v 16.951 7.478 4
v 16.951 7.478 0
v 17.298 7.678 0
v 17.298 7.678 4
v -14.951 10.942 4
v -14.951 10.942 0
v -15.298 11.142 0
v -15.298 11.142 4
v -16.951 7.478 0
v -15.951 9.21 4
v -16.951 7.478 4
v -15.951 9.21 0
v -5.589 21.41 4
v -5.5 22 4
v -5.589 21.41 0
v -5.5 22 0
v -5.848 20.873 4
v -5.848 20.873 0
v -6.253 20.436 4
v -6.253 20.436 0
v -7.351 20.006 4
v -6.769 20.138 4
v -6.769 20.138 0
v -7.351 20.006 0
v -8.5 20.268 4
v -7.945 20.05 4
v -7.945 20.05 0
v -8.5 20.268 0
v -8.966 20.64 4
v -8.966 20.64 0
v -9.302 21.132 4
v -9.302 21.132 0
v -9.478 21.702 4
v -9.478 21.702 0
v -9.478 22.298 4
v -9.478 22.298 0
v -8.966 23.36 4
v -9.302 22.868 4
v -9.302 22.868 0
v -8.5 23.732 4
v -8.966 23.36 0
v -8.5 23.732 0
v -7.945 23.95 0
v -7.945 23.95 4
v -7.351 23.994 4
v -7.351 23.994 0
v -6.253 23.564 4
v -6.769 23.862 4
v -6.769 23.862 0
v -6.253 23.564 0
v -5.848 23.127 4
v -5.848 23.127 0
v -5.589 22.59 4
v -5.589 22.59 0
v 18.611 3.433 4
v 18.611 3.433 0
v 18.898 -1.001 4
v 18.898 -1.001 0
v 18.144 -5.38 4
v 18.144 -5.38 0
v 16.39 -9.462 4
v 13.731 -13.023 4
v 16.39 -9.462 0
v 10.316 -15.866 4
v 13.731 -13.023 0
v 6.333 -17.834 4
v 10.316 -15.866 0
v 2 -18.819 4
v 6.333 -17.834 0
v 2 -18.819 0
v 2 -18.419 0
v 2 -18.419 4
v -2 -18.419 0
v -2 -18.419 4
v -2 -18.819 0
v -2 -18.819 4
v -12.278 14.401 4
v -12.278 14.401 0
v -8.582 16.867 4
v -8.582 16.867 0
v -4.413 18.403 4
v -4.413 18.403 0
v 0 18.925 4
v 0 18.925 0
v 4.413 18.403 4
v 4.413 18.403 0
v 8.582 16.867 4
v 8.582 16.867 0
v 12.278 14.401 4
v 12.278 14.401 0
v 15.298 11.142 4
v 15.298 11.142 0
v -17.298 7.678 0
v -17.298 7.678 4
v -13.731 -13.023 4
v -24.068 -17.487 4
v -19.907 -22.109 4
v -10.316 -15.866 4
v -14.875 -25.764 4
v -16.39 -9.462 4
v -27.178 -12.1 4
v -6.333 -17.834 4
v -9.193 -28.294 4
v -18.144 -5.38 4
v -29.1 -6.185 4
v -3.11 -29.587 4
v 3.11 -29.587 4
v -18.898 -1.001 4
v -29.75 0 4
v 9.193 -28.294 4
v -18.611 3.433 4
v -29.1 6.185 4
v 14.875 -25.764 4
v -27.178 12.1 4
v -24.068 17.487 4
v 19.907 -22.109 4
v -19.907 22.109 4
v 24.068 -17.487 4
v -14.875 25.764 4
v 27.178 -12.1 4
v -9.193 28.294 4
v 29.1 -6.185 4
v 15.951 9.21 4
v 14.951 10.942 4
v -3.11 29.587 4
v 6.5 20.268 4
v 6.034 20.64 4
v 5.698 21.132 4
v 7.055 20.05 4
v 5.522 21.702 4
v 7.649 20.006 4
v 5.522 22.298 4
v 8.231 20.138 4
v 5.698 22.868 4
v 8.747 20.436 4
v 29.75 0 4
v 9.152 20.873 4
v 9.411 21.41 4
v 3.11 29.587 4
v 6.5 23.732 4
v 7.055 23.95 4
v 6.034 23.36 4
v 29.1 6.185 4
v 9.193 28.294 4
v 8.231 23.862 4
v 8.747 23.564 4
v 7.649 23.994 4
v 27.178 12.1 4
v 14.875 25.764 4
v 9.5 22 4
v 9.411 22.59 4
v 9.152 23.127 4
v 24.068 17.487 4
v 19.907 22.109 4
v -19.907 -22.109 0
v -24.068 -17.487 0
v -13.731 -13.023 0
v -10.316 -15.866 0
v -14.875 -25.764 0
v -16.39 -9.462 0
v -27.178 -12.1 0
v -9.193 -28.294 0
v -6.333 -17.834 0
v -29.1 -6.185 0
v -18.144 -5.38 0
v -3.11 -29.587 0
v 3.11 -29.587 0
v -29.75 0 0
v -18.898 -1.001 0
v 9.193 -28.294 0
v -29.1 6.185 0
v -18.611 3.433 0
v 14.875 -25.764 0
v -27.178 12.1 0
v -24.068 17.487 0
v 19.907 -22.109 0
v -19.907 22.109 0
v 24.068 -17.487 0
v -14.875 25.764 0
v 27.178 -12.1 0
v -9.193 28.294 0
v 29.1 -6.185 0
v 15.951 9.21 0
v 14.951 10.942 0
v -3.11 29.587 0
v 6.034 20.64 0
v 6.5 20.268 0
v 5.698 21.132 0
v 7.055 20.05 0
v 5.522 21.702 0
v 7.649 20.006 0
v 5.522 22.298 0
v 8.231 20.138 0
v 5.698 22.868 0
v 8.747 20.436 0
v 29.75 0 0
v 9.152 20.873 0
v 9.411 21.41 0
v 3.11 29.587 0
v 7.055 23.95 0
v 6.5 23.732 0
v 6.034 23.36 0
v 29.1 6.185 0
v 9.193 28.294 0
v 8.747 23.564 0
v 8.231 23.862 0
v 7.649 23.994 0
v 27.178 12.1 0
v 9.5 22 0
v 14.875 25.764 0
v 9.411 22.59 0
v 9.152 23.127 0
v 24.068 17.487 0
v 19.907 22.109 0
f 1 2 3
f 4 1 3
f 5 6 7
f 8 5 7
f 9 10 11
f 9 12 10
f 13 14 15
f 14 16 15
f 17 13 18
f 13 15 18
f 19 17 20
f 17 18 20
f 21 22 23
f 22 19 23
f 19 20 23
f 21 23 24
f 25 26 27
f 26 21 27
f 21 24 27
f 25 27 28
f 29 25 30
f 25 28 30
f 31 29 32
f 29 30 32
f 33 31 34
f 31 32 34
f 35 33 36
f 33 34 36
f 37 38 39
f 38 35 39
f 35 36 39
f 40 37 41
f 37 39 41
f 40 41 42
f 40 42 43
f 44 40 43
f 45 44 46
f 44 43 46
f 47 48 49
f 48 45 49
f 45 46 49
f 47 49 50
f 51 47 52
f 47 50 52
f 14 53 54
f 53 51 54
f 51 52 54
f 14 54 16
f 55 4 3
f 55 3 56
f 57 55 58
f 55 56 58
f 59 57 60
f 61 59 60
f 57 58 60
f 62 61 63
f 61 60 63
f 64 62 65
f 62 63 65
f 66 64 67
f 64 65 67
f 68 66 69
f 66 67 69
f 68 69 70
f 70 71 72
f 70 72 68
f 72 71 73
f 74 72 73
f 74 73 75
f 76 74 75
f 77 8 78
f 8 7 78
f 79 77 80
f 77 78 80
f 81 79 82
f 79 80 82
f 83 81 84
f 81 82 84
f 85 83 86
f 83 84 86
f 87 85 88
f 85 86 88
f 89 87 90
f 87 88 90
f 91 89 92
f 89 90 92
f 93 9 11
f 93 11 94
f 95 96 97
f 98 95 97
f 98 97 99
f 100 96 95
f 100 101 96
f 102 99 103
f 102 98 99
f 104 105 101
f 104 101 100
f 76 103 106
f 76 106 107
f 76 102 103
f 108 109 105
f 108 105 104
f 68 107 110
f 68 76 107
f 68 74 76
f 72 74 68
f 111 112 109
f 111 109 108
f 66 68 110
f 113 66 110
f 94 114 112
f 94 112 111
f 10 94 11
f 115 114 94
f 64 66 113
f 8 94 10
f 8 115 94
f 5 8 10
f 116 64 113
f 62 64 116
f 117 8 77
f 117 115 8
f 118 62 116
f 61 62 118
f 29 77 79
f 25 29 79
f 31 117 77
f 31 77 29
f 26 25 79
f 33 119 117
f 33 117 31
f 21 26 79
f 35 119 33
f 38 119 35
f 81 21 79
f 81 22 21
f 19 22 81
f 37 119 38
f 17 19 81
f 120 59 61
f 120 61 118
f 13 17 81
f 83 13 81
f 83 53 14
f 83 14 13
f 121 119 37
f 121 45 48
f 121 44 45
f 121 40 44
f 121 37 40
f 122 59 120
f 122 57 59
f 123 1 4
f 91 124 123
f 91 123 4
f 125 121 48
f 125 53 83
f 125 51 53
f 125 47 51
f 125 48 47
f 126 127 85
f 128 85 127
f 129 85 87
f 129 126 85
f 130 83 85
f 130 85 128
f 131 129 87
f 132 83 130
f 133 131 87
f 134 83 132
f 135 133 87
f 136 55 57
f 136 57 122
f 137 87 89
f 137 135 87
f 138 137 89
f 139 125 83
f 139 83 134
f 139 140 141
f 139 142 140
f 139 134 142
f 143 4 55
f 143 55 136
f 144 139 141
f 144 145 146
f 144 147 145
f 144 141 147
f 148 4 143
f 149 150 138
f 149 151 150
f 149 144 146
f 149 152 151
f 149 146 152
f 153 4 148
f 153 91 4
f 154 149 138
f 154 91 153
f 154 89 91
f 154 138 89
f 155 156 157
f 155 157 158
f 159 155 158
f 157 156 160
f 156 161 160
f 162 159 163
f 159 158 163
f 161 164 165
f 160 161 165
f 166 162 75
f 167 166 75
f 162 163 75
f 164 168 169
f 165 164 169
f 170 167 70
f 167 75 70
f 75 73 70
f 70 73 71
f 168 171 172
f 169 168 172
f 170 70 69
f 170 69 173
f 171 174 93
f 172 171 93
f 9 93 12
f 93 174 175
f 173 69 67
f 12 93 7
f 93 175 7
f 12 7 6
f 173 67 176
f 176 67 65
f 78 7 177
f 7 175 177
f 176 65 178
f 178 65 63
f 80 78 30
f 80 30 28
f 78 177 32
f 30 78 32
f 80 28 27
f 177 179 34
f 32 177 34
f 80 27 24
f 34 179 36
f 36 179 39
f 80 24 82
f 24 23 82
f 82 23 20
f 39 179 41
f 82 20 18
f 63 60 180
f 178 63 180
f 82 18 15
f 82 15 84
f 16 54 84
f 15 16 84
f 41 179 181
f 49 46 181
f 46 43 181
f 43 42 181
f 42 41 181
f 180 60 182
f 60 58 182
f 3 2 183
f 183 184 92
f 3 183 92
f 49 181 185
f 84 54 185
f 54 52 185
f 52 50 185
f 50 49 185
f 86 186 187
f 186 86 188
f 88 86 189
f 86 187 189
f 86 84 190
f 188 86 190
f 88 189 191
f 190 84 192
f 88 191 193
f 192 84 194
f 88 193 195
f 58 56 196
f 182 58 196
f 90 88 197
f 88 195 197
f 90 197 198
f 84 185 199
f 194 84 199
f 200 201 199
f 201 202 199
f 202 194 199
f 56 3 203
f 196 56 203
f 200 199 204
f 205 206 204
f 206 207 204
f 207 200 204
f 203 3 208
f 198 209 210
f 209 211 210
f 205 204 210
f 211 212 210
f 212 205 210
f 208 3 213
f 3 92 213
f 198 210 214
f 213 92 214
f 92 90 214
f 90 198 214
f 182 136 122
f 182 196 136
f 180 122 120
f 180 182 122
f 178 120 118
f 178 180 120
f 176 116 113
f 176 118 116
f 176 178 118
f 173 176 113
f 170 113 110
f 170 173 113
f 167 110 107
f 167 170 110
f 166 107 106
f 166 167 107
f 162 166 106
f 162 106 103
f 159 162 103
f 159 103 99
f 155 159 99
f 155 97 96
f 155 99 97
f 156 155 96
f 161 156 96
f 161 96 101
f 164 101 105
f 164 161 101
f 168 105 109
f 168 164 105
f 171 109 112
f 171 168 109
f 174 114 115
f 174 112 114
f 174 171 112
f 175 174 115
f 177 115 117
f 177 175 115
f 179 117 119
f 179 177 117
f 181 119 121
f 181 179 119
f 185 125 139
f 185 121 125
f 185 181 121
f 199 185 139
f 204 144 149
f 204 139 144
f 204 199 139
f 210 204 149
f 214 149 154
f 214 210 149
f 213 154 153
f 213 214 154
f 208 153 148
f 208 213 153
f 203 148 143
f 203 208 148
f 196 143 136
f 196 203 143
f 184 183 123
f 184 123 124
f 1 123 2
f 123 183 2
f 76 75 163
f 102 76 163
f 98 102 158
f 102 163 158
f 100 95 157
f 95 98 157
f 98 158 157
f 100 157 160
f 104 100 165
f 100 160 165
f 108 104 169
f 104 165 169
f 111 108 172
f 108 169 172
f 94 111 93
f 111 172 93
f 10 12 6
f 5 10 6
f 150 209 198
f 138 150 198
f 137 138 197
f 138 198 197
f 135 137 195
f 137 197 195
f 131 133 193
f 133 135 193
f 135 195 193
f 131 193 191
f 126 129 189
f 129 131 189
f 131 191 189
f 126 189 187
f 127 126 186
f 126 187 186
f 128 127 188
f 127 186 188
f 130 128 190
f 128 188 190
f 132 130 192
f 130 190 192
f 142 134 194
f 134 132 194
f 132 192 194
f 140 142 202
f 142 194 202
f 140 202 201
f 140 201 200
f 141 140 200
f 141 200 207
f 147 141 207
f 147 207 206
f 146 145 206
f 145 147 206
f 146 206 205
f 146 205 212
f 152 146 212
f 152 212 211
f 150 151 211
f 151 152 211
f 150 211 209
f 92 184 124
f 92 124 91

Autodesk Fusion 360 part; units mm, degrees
sketch "Sketch1" plane through (0, 0, 0) normal (0, 0, 1) x (1, 0, 0)
  circle A0 centre (0, 0) radius 29.75
  circle A1 centre (0, 0) radius 18.925
  line L0 (0, 0) -> (0, 29.75) construction
  circle A2 centre (-7.5, 22) radius 2
  circle A3 centre (7.5, 22) radius 2
  line L1 (0, -18.419) -> (2, -18.419)
  line L2 (2, -18.419) -> (2, -18.819)
  line L3 (0, -18.925) -> (0, -18.419) construction
  line L4 (-2, -18.419) -> (-2, -18.819)
  line L5 (0, -18.419) -> (-2, -18.419)
  line L6 (16.9513, 7.4775) -> (17.2978, 7.6775)
  line L7 (15.9513, 9.2095) -> (16.9513, 7.4775)
  line L8 (15.9513, 9.2095) -> (14.9513, 10.9416)
  line L9 (14.9513, 10.9416) -> (15.2978, 11.1416)
  line L10 (-14.9513, 10.9416) -> (-15.2978, 11.1416)
  line L11 (-15.9513, 9.2095) -> (-14.9513, 10.9416)
  line L12 (-15.9513, 9.2095) -> (-16.9513, 7.4775)
  line L13 (-16.9513, 7.4775) -> (-17.2978, 7.6775)
  dimension "d1" = 59.5
  dimension "d78" = 37.85
  dimension "d131" = 4
  dimension "d132" = 7.5
  dimension "d135" = 2
  dimension "d136" = 0.4
  dimension "d138" = 360
extrude "Extrude16" add sketch "Sketch1" along normal blind 4 contours A0 | A1 L6 L7 L8 L9 | A1 L1 L2 L4 L5 | A1 L10 L11 L12 L13 | A2 | A3
extrude "Extrude17" cut sketch "Sketch1" along normal blind 4 contours A2 | A3
